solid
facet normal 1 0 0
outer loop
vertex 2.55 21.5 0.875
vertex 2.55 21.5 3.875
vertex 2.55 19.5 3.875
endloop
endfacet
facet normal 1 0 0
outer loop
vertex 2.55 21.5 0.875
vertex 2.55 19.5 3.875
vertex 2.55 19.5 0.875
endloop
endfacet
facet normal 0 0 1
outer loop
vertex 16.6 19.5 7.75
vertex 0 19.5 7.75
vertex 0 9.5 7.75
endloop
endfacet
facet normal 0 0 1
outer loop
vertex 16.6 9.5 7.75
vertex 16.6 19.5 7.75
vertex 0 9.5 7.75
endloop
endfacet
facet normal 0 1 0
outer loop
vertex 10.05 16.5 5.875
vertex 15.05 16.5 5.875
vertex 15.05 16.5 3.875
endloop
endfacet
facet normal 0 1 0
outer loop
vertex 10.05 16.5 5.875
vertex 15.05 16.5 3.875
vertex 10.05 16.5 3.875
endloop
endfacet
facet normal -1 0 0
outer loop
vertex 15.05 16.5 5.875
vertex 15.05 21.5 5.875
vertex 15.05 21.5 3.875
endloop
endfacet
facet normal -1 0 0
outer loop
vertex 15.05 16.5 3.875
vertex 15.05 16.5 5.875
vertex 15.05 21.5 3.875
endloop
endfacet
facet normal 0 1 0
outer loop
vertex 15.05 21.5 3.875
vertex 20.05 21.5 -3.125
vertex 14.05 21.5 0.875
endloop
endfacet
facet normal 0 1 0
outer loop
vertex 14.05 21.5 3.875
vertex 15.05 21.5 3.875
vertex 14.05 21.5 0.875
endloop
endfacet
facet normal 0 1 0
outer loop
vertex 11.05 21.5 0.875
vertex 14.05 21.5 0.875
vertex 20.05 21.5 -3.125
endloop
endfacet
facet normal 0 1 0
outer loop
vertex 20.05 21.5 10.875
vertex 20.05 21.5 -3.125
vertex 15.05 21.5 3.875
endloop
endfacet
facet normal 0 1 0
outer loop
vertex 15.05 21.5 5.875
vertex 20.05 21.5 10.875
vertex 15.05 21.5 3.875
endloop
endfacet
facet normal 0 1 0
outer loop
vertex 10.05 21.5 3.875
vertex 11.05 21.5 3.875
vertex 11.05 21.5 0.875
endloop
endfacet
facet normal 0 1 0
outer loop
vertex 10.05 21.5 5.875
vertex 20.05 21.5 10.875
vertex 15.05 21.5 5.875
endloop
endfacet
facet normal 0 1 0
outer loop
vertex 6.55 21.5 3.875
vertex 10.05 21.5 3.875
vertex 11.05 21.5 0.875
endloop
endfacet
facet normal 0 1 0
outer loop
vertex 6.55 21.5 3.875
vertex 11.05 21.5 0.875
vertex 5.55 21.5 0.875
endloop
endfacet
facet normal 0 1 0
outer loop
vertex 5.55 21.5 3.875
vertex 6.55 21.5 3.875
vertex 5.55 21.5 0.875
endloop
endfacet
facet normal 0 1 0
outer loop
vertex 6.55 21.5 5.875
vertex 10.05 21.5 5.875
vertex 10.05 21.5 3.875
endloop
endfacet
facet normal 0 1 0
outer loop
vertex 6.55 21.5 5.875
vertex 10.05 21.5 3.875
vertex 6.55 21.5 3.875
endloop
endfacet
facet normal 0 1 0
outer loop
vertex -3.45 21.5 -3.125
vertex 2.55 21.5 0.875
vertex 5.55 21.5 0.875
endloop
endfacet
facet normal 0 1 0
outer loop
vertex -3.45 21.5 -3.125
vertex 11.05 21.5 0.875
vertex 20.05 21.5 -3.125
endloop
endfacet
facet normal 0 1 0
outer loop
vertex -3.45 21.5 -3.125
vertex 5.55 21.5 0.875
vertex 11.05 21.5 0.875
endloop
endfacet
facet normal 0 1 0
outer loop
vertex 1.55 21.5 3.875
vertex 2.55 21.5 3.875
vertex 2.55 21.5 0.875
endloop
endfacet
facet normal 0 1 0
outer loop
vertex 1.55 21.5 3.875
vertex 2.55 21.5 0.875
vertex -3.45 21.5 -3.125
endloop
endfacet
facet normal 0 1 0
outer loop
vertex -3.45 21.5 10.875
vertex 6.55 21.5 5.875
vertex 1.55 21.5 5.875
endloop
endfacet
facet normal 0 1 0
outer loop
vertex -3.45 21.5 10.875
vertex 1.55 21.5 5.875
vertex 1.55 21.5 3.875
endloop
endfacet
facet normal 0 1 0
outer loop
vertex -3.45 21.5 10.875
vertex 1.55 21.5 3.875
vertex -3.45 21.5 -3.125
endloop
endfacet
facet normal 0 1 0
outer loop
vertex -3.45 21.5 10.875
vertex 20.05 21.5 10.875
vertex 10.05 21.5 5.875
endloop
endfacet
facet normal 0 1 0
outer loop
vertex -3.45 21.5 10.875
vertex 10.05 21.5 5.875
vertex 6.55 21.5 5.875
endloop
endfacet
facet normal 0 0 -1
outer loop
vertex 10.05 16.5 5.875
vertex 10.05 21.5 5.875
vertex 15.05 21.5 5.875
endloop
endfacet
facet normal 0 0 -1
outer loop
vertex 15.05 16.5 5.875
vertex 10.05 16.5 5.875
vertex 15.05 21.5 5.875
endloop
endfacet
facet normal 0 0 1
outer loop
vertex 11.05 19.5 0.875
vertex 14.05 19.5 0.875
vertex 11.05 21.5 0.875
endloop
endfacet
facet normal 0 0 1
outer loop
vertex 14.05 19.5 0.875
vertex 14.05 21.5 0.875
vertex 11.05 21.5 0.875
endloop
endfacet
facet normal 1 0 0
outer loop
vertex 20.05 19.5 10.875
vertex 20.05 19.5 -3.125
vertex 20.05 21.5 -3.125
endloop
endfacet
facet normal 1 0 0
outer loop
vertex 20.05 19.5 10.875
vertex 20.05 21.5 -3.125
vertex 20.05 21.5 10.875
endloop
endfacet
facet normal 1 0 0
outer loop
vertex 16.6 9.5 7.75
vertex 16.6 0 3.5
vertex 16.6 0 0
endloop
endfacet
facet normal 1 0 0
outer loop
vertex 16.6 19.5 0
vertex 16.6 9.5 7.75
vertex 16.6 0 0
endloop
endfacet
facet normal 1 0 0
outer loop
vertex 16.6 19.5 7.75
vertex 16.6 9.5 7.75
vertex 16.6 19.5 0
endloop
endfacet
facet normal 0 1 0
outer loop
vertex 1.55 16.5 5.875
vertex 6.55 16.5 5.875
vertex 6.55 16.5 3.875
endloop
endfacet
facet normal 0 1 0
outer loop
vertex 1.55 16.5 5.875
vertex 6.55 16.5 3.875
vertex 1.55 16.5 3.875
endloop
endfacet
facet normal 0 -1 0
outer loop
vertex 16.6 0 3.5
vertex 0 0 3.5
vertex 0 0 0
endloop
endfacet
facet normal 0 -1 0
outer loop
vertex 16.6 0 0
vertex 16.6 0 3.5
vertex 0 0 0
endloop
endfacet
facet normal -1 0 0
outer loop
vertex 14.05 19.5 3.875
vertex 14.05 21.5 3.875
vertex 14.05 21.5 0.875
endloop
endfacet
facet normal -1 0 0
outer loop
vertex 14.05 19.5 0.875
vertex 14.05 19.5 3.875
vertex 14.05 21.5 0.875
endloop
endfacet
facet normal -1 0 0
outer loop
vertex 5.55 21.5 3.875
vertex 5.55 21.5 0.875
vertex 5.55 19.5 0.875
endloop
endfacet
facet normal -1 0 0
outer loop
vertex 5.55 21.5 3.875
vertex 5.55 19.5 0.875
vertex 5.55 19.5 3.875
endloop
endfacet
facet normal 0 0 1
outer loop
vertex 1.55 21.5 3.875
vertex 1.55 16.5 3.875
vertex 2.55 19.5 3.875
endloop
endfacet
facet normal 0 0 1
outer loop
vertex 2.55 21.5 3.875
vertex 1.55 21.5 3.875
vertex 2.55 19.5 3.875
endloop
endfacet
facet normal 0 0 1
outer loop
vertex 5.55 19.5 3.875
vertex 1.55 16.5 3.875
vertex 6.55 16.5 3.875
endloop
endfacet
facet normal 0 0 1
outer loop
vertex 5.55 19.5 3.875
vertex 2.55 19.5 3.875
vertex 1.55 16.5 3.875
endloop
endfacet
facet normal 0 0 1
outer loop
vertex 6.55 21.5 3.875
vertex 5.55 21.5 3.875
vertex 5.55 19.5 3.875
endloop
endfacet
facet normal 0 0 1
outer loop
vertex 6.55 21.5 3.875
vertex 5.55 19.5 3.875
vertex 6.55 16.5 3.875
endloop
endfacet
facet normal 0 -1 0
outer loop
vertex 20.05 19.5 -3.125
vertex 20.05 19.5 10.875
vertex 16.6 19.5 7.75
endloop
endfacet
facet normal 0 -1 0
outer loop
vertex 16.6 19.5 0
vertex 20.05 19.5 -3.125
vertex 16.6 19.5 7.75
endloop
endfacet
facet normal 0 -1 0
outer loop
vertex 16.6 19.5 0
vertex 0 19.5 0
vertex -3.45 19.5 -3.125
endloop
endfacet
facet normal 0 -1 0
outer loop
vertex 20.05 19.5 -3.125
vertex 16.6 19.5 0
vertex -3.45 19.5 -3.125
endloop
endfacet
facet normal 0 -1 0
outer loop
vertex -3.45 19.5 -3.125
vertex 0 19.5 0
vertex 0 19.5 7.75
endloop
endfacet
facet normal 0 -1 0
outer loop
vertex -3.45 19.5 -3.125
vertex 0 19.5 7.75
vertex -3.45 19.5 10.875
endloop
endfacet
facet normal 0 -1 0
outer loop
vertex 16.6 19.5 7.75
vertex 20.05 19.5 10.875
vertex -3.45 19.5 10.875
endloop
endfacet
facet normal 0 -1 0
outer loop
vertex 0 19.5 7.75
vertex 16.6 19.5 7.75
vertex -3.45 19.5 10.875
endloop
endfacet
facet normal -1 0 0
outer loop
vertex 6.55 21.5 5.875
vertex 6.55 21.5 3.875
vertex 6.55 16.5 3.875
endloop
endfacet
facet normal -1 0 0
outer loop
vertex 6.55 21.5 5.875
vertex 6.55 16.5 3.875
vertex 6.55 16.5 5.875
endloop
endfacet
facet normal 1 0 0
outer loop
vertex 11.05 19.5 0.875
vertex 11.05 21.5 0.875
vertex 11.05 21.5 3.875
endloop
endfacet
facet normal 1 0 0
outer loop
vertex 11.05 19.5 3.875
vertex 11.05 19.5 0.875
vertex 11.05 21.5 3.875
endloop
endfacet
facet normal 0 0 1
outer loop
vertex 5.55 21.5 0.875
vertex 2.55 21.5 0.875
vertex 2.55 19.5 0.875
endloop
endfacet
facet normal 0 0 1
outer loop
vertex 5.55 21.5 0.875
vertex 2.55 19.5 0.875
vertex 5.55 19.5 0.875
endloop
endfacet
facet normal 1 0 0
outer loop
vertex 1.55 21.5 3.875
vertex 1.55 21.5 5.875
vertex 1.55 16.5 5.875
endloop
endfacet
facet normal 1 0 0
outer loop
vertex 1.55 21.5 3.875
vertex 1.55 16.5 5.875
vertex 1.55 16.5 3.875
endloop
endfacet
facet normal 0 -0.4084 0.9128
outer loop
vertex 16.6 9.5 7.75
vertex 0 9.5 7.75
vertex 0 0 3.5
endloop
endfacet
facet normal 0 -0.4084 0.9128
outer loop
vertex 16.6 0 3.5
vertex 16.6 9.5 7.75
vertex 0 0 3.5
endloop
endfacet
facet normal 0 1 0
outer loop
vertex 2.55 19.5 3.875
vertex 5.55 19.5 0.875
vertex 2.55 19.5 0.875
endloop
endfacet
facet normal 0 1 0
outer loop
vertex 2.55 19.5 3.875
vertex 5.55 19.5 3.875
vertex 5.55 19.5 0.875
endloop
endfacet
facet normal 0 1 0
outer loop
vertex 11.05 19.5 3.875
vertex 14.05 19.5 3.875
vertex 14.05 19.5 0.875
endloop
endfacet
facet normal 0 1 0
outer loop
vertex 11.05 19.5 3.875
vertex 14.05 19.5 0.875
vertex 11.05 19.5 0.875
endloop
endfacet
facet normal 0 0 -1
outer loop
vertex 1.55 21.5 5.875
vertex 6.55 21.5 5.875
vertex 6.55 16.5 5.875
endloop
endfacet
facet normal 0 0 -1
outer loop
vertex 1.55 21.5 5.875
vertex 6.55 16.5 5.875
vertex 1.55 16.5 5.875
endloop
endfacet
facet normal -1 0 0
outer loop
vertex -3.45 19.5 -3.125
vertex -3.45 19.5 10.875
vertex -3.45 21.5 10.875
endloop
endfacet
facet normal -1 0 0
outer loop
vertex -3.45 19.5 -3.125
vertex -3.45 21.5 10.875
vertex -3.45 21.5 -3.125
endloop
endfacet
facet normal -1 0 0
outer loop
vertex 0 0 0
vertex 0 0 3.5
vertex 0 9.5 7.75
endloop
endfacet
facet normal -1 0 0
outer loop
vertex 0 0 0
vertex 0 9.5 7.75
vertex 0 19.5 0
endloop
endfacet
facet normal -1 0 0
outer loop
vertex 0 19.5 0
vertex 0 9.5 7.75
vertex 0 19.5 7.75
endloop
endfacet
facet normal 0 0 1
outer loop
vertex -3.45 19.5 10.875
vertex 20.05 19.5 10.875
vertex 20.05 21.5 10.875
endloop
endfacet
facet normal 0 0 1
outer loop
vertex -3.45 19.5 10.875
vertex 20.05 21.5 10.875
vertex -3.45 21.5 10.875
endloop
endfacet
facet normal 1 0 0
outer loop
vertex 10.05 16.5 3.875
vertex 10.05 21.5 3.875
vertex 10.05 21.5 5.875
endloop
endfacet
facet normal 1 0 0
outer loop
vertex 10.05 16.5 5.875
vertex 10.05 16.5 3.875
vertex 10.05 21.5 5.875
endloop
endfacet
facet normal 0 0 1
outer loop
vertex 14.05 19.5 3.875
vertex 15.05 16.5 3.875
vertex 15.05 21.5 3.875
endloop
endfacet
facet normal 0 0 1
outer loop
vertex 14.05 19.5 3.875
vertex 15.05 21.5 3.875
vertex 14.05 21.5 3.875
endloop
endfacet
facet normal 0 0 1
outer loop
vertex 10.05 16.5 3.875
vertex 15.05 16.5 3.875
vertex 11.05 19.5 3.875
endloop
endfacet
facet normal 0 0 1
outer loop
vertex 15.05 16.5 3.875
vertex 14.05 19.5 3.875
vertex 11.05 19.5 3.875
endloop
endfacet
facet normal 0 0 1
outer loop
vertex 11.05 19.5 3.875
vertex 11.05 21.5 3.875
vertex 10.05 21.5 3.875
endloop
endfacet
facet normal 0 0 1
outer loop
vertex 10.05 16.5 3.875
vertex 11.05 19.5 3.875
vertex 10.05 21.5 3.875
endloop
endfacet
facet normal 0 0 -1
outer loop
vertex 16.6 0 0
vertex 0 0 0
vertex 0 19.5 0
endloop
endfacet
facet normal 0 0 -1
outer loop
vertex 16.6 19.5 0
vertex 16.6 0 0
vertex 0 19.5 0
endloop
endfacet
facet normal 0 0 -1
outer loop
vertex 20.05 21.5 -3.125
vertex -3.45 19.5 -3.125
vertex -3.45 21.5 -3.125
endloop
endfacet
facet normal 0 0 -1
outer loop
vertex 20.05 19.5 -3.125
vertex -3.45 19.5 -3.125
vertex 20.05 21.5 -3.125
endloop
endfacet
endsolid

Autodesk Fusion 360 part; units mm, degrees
sketch "Esquisse1" plane through (0, 0, 0) normal (1, 0, 0) x (0, 1, 0)
  line L0 (0, 0) -> (19.5, 0)
  line L1 (19.5, 0) -> (19.5, 7.75)
  line L2 (19.5, 7.75) -> (9.5, 7.75)
  line L3 (9.5, 7.75) -> (0, 3.5)
  line L4 (0, 3.5) -> (0, 0)
  dimension "d1" = 7.75
  dimension "d2" = 19.5
  dimension "d3" = 10
  dimension "d4" = 3.5
extrude "Extrusion1" add sketch "Esquisse1" along normal blind 16.6
sketch "Esquisse2" plane through (0, 19.5, 0) normal (0, 1, 0) x (-1, 0, 0)
  line L0 (0, 0) -> (0, 7.75)
  line L1 (0, 7.75) -> (-16.6, 7.75)
  line L2 (-16.6, 7.75) -> (-16.6, 0)
  line L3 (-16.6, 0) -> (0, 0)
  line L4 (-20.05, 10.875) -> (3.45, 10.875)
  line L5 (3.45, 10.875) -> (3.45, -3.125)
  line L6 (3.45, -3.125) -> (-20.05, -3.125)
  line L7 (-20.05, -3.125) -> (-20.05, 10.875)
  dimension "d7" = 23.5
  dimension "d8" = 14
  dimension "d9" = 3.45
  dimension "d10" = 3.125
extrude "Extrusion2" add sketch "Esquisse2" along normal blind 2 contours L0 L1 L2 L3 | L4 L5 L6 L7
sketch "Esquisse3" plane through (0, 21.5, 0) normal (0, 1, 0) x (-1, 0, 0)
  line L0 (-20.05, -3.125) -> (3.45, -3.125)
  line L1 (3.45, -3.125) -> (3.45, 10.875)
  line L2 (3.45, 10.875) -> (-20.05, 10.875)
  line L3 (-20.05, 10.875) -> (-20.05, -3.125)
  line L4 (-8.3, 10.875) -> (-8.3, -3.125)
  line L5 (-14.05, 0.875) -> (-11.05, 0.875)
  line L6 (-11.05, 0.875) -> (-11.05, 3.875)
  line L7 (-11.05, 3.875) -> (-10.05, 3.875)
  line L8 (-10.05, 3.875) -> (-10.05, 5.875)
  line L9 (-10.05, 5.875) -> (-15.05, 5.875)
  line L10 (-15.05, 5.875) -> (-15.05, 3.875)
  line L11 (-15.05, 3.875) -> (-14.05, 3.875)
  line L12 (-14.05, 3.875) -> (-14.05, 0.875)
  line L13 (-1.55, 3.875) -> (-2.55, 3.875)
  line L14 (-6.55, 5.875) -> (-1.55, 5.875)
  line L15 (-6.55, 3.875) -> (-6.55, 5.875)
  line L16 (-5.55, 3.875) -> (-6.55, 3.875)
  line L17 (-5.55, 0.875) -> (-5.55, 3.875)
  line L18 (-2.55, 0.875) -> (-5.55, 0.875)
  line L19 (-2.55, 3.875) -> (-2.55, 0.875)
  line L20 (-1.55, 5.875) -> (-1.55, 3.875)
  line L21 (-14.05, 3.875) -> (-11.05, 3.875)
  line L22 (-2.55, 3.875) -> (-5.55, 3.875)
  dimension "d14" = 5
  dimension "d15" = 2
  dimension "d16" = 5
  dimension "d17" = 3
  dimension "d18" = 5
  dimension "d19" = 5
extrude "Extrusion3" cut sketch "Esquisse3" against normal blind 2 contours L5 L6 L12 L21 | L7 L8 L9 L10 L11 L21 | L13 L14 L15 L16 L20 L22 | L17 L18 L19 L22
sketch "Esquisse4" plane through (0, 21.5, 0) normal (0, 1, 0) x (-1, 0, 0)
  line L0 (-11.05, 0.875) -> (-14.05, 0.875)
  line L1 (-14.05, 0.875) -> (-14.05, 3.875)
  line L2 (-14.05, 3.875) -> (-15.05, 3.875)
  line L3 (-15.05, 3.875) -> (-15.05, 5.875)
  line L4 (-15.05, 5.875) -> (-10.05, 5.875)
  line L5 (-10.05, 5.875) -> (-10.05, 3.875)
  line L6 (-10.05, 3.875) -> (-11.05, 3.875)
  line L7 (-11.05, 3.875) -> (-11.05, 0.875)
  line L8 (-6.55, 3.875) -> (-6.55, 5.875)
  line L9 (-6.55, 5.875) -> (-1.55, 5.875)
  line L10 (-1.55, 5.875) -> (-1.55, 3.875)
  line L11 (-1.55, 3.875) -> (-2.55, 3.875)
  line L12 (-2.55, 3.875) -> (-2.55, 0.875)
  line L13 (-2.55, 0.875) -> (-5.55, 0.875)
  line L14 (-5.55, 0.875) -> (-5.55, 3.875)
  line L15 (-5.55, 3.875) -> (-6.55, 3.875)
  line L16 (-20.05, -3.125) -> (3.45, -3.125)
  line L17 (3.45, -3.125) -> (3.45, 10.875)
  line L18 (3.45, 10.875) -> (-20.05, 10.875)
  line L19 (-20.05, 10.875) -> (-20.05, -3.125)
  line L20 (-15.05, 5.875) -> (-10.05, 5.875)
  line L21 (-10.05, 5.875) -> (-10.05, 3.875)
  line L22 (-10.05, 3.875) -> (-15.05, 3.875)
  line L23 (-15.05, 3.875) -> (-15.05, 5.875)
  line L24 (-6.55, 5.875) -> (-1.55, 5.875)
  line L25 (-1.55, 5.875) -> (-1.55, 3.875)
  line L26 (-1.55, 3.875) -> (-6.55, 3.875)
  line L27 (-6.55, 3.875) -> (-6.55, 5.875)
extrude "Extrusion4" cut sketch "Esquisse4" against normal blind 5 contours L2 L3 L4 L5 L6 L20 L21 L22 L23 | L8 L9 L10 L11 L15 L24 L25 L26 L27
chamfer "Chanfrein1" [suppressed]
fillet "Congé1" [suppressed]
